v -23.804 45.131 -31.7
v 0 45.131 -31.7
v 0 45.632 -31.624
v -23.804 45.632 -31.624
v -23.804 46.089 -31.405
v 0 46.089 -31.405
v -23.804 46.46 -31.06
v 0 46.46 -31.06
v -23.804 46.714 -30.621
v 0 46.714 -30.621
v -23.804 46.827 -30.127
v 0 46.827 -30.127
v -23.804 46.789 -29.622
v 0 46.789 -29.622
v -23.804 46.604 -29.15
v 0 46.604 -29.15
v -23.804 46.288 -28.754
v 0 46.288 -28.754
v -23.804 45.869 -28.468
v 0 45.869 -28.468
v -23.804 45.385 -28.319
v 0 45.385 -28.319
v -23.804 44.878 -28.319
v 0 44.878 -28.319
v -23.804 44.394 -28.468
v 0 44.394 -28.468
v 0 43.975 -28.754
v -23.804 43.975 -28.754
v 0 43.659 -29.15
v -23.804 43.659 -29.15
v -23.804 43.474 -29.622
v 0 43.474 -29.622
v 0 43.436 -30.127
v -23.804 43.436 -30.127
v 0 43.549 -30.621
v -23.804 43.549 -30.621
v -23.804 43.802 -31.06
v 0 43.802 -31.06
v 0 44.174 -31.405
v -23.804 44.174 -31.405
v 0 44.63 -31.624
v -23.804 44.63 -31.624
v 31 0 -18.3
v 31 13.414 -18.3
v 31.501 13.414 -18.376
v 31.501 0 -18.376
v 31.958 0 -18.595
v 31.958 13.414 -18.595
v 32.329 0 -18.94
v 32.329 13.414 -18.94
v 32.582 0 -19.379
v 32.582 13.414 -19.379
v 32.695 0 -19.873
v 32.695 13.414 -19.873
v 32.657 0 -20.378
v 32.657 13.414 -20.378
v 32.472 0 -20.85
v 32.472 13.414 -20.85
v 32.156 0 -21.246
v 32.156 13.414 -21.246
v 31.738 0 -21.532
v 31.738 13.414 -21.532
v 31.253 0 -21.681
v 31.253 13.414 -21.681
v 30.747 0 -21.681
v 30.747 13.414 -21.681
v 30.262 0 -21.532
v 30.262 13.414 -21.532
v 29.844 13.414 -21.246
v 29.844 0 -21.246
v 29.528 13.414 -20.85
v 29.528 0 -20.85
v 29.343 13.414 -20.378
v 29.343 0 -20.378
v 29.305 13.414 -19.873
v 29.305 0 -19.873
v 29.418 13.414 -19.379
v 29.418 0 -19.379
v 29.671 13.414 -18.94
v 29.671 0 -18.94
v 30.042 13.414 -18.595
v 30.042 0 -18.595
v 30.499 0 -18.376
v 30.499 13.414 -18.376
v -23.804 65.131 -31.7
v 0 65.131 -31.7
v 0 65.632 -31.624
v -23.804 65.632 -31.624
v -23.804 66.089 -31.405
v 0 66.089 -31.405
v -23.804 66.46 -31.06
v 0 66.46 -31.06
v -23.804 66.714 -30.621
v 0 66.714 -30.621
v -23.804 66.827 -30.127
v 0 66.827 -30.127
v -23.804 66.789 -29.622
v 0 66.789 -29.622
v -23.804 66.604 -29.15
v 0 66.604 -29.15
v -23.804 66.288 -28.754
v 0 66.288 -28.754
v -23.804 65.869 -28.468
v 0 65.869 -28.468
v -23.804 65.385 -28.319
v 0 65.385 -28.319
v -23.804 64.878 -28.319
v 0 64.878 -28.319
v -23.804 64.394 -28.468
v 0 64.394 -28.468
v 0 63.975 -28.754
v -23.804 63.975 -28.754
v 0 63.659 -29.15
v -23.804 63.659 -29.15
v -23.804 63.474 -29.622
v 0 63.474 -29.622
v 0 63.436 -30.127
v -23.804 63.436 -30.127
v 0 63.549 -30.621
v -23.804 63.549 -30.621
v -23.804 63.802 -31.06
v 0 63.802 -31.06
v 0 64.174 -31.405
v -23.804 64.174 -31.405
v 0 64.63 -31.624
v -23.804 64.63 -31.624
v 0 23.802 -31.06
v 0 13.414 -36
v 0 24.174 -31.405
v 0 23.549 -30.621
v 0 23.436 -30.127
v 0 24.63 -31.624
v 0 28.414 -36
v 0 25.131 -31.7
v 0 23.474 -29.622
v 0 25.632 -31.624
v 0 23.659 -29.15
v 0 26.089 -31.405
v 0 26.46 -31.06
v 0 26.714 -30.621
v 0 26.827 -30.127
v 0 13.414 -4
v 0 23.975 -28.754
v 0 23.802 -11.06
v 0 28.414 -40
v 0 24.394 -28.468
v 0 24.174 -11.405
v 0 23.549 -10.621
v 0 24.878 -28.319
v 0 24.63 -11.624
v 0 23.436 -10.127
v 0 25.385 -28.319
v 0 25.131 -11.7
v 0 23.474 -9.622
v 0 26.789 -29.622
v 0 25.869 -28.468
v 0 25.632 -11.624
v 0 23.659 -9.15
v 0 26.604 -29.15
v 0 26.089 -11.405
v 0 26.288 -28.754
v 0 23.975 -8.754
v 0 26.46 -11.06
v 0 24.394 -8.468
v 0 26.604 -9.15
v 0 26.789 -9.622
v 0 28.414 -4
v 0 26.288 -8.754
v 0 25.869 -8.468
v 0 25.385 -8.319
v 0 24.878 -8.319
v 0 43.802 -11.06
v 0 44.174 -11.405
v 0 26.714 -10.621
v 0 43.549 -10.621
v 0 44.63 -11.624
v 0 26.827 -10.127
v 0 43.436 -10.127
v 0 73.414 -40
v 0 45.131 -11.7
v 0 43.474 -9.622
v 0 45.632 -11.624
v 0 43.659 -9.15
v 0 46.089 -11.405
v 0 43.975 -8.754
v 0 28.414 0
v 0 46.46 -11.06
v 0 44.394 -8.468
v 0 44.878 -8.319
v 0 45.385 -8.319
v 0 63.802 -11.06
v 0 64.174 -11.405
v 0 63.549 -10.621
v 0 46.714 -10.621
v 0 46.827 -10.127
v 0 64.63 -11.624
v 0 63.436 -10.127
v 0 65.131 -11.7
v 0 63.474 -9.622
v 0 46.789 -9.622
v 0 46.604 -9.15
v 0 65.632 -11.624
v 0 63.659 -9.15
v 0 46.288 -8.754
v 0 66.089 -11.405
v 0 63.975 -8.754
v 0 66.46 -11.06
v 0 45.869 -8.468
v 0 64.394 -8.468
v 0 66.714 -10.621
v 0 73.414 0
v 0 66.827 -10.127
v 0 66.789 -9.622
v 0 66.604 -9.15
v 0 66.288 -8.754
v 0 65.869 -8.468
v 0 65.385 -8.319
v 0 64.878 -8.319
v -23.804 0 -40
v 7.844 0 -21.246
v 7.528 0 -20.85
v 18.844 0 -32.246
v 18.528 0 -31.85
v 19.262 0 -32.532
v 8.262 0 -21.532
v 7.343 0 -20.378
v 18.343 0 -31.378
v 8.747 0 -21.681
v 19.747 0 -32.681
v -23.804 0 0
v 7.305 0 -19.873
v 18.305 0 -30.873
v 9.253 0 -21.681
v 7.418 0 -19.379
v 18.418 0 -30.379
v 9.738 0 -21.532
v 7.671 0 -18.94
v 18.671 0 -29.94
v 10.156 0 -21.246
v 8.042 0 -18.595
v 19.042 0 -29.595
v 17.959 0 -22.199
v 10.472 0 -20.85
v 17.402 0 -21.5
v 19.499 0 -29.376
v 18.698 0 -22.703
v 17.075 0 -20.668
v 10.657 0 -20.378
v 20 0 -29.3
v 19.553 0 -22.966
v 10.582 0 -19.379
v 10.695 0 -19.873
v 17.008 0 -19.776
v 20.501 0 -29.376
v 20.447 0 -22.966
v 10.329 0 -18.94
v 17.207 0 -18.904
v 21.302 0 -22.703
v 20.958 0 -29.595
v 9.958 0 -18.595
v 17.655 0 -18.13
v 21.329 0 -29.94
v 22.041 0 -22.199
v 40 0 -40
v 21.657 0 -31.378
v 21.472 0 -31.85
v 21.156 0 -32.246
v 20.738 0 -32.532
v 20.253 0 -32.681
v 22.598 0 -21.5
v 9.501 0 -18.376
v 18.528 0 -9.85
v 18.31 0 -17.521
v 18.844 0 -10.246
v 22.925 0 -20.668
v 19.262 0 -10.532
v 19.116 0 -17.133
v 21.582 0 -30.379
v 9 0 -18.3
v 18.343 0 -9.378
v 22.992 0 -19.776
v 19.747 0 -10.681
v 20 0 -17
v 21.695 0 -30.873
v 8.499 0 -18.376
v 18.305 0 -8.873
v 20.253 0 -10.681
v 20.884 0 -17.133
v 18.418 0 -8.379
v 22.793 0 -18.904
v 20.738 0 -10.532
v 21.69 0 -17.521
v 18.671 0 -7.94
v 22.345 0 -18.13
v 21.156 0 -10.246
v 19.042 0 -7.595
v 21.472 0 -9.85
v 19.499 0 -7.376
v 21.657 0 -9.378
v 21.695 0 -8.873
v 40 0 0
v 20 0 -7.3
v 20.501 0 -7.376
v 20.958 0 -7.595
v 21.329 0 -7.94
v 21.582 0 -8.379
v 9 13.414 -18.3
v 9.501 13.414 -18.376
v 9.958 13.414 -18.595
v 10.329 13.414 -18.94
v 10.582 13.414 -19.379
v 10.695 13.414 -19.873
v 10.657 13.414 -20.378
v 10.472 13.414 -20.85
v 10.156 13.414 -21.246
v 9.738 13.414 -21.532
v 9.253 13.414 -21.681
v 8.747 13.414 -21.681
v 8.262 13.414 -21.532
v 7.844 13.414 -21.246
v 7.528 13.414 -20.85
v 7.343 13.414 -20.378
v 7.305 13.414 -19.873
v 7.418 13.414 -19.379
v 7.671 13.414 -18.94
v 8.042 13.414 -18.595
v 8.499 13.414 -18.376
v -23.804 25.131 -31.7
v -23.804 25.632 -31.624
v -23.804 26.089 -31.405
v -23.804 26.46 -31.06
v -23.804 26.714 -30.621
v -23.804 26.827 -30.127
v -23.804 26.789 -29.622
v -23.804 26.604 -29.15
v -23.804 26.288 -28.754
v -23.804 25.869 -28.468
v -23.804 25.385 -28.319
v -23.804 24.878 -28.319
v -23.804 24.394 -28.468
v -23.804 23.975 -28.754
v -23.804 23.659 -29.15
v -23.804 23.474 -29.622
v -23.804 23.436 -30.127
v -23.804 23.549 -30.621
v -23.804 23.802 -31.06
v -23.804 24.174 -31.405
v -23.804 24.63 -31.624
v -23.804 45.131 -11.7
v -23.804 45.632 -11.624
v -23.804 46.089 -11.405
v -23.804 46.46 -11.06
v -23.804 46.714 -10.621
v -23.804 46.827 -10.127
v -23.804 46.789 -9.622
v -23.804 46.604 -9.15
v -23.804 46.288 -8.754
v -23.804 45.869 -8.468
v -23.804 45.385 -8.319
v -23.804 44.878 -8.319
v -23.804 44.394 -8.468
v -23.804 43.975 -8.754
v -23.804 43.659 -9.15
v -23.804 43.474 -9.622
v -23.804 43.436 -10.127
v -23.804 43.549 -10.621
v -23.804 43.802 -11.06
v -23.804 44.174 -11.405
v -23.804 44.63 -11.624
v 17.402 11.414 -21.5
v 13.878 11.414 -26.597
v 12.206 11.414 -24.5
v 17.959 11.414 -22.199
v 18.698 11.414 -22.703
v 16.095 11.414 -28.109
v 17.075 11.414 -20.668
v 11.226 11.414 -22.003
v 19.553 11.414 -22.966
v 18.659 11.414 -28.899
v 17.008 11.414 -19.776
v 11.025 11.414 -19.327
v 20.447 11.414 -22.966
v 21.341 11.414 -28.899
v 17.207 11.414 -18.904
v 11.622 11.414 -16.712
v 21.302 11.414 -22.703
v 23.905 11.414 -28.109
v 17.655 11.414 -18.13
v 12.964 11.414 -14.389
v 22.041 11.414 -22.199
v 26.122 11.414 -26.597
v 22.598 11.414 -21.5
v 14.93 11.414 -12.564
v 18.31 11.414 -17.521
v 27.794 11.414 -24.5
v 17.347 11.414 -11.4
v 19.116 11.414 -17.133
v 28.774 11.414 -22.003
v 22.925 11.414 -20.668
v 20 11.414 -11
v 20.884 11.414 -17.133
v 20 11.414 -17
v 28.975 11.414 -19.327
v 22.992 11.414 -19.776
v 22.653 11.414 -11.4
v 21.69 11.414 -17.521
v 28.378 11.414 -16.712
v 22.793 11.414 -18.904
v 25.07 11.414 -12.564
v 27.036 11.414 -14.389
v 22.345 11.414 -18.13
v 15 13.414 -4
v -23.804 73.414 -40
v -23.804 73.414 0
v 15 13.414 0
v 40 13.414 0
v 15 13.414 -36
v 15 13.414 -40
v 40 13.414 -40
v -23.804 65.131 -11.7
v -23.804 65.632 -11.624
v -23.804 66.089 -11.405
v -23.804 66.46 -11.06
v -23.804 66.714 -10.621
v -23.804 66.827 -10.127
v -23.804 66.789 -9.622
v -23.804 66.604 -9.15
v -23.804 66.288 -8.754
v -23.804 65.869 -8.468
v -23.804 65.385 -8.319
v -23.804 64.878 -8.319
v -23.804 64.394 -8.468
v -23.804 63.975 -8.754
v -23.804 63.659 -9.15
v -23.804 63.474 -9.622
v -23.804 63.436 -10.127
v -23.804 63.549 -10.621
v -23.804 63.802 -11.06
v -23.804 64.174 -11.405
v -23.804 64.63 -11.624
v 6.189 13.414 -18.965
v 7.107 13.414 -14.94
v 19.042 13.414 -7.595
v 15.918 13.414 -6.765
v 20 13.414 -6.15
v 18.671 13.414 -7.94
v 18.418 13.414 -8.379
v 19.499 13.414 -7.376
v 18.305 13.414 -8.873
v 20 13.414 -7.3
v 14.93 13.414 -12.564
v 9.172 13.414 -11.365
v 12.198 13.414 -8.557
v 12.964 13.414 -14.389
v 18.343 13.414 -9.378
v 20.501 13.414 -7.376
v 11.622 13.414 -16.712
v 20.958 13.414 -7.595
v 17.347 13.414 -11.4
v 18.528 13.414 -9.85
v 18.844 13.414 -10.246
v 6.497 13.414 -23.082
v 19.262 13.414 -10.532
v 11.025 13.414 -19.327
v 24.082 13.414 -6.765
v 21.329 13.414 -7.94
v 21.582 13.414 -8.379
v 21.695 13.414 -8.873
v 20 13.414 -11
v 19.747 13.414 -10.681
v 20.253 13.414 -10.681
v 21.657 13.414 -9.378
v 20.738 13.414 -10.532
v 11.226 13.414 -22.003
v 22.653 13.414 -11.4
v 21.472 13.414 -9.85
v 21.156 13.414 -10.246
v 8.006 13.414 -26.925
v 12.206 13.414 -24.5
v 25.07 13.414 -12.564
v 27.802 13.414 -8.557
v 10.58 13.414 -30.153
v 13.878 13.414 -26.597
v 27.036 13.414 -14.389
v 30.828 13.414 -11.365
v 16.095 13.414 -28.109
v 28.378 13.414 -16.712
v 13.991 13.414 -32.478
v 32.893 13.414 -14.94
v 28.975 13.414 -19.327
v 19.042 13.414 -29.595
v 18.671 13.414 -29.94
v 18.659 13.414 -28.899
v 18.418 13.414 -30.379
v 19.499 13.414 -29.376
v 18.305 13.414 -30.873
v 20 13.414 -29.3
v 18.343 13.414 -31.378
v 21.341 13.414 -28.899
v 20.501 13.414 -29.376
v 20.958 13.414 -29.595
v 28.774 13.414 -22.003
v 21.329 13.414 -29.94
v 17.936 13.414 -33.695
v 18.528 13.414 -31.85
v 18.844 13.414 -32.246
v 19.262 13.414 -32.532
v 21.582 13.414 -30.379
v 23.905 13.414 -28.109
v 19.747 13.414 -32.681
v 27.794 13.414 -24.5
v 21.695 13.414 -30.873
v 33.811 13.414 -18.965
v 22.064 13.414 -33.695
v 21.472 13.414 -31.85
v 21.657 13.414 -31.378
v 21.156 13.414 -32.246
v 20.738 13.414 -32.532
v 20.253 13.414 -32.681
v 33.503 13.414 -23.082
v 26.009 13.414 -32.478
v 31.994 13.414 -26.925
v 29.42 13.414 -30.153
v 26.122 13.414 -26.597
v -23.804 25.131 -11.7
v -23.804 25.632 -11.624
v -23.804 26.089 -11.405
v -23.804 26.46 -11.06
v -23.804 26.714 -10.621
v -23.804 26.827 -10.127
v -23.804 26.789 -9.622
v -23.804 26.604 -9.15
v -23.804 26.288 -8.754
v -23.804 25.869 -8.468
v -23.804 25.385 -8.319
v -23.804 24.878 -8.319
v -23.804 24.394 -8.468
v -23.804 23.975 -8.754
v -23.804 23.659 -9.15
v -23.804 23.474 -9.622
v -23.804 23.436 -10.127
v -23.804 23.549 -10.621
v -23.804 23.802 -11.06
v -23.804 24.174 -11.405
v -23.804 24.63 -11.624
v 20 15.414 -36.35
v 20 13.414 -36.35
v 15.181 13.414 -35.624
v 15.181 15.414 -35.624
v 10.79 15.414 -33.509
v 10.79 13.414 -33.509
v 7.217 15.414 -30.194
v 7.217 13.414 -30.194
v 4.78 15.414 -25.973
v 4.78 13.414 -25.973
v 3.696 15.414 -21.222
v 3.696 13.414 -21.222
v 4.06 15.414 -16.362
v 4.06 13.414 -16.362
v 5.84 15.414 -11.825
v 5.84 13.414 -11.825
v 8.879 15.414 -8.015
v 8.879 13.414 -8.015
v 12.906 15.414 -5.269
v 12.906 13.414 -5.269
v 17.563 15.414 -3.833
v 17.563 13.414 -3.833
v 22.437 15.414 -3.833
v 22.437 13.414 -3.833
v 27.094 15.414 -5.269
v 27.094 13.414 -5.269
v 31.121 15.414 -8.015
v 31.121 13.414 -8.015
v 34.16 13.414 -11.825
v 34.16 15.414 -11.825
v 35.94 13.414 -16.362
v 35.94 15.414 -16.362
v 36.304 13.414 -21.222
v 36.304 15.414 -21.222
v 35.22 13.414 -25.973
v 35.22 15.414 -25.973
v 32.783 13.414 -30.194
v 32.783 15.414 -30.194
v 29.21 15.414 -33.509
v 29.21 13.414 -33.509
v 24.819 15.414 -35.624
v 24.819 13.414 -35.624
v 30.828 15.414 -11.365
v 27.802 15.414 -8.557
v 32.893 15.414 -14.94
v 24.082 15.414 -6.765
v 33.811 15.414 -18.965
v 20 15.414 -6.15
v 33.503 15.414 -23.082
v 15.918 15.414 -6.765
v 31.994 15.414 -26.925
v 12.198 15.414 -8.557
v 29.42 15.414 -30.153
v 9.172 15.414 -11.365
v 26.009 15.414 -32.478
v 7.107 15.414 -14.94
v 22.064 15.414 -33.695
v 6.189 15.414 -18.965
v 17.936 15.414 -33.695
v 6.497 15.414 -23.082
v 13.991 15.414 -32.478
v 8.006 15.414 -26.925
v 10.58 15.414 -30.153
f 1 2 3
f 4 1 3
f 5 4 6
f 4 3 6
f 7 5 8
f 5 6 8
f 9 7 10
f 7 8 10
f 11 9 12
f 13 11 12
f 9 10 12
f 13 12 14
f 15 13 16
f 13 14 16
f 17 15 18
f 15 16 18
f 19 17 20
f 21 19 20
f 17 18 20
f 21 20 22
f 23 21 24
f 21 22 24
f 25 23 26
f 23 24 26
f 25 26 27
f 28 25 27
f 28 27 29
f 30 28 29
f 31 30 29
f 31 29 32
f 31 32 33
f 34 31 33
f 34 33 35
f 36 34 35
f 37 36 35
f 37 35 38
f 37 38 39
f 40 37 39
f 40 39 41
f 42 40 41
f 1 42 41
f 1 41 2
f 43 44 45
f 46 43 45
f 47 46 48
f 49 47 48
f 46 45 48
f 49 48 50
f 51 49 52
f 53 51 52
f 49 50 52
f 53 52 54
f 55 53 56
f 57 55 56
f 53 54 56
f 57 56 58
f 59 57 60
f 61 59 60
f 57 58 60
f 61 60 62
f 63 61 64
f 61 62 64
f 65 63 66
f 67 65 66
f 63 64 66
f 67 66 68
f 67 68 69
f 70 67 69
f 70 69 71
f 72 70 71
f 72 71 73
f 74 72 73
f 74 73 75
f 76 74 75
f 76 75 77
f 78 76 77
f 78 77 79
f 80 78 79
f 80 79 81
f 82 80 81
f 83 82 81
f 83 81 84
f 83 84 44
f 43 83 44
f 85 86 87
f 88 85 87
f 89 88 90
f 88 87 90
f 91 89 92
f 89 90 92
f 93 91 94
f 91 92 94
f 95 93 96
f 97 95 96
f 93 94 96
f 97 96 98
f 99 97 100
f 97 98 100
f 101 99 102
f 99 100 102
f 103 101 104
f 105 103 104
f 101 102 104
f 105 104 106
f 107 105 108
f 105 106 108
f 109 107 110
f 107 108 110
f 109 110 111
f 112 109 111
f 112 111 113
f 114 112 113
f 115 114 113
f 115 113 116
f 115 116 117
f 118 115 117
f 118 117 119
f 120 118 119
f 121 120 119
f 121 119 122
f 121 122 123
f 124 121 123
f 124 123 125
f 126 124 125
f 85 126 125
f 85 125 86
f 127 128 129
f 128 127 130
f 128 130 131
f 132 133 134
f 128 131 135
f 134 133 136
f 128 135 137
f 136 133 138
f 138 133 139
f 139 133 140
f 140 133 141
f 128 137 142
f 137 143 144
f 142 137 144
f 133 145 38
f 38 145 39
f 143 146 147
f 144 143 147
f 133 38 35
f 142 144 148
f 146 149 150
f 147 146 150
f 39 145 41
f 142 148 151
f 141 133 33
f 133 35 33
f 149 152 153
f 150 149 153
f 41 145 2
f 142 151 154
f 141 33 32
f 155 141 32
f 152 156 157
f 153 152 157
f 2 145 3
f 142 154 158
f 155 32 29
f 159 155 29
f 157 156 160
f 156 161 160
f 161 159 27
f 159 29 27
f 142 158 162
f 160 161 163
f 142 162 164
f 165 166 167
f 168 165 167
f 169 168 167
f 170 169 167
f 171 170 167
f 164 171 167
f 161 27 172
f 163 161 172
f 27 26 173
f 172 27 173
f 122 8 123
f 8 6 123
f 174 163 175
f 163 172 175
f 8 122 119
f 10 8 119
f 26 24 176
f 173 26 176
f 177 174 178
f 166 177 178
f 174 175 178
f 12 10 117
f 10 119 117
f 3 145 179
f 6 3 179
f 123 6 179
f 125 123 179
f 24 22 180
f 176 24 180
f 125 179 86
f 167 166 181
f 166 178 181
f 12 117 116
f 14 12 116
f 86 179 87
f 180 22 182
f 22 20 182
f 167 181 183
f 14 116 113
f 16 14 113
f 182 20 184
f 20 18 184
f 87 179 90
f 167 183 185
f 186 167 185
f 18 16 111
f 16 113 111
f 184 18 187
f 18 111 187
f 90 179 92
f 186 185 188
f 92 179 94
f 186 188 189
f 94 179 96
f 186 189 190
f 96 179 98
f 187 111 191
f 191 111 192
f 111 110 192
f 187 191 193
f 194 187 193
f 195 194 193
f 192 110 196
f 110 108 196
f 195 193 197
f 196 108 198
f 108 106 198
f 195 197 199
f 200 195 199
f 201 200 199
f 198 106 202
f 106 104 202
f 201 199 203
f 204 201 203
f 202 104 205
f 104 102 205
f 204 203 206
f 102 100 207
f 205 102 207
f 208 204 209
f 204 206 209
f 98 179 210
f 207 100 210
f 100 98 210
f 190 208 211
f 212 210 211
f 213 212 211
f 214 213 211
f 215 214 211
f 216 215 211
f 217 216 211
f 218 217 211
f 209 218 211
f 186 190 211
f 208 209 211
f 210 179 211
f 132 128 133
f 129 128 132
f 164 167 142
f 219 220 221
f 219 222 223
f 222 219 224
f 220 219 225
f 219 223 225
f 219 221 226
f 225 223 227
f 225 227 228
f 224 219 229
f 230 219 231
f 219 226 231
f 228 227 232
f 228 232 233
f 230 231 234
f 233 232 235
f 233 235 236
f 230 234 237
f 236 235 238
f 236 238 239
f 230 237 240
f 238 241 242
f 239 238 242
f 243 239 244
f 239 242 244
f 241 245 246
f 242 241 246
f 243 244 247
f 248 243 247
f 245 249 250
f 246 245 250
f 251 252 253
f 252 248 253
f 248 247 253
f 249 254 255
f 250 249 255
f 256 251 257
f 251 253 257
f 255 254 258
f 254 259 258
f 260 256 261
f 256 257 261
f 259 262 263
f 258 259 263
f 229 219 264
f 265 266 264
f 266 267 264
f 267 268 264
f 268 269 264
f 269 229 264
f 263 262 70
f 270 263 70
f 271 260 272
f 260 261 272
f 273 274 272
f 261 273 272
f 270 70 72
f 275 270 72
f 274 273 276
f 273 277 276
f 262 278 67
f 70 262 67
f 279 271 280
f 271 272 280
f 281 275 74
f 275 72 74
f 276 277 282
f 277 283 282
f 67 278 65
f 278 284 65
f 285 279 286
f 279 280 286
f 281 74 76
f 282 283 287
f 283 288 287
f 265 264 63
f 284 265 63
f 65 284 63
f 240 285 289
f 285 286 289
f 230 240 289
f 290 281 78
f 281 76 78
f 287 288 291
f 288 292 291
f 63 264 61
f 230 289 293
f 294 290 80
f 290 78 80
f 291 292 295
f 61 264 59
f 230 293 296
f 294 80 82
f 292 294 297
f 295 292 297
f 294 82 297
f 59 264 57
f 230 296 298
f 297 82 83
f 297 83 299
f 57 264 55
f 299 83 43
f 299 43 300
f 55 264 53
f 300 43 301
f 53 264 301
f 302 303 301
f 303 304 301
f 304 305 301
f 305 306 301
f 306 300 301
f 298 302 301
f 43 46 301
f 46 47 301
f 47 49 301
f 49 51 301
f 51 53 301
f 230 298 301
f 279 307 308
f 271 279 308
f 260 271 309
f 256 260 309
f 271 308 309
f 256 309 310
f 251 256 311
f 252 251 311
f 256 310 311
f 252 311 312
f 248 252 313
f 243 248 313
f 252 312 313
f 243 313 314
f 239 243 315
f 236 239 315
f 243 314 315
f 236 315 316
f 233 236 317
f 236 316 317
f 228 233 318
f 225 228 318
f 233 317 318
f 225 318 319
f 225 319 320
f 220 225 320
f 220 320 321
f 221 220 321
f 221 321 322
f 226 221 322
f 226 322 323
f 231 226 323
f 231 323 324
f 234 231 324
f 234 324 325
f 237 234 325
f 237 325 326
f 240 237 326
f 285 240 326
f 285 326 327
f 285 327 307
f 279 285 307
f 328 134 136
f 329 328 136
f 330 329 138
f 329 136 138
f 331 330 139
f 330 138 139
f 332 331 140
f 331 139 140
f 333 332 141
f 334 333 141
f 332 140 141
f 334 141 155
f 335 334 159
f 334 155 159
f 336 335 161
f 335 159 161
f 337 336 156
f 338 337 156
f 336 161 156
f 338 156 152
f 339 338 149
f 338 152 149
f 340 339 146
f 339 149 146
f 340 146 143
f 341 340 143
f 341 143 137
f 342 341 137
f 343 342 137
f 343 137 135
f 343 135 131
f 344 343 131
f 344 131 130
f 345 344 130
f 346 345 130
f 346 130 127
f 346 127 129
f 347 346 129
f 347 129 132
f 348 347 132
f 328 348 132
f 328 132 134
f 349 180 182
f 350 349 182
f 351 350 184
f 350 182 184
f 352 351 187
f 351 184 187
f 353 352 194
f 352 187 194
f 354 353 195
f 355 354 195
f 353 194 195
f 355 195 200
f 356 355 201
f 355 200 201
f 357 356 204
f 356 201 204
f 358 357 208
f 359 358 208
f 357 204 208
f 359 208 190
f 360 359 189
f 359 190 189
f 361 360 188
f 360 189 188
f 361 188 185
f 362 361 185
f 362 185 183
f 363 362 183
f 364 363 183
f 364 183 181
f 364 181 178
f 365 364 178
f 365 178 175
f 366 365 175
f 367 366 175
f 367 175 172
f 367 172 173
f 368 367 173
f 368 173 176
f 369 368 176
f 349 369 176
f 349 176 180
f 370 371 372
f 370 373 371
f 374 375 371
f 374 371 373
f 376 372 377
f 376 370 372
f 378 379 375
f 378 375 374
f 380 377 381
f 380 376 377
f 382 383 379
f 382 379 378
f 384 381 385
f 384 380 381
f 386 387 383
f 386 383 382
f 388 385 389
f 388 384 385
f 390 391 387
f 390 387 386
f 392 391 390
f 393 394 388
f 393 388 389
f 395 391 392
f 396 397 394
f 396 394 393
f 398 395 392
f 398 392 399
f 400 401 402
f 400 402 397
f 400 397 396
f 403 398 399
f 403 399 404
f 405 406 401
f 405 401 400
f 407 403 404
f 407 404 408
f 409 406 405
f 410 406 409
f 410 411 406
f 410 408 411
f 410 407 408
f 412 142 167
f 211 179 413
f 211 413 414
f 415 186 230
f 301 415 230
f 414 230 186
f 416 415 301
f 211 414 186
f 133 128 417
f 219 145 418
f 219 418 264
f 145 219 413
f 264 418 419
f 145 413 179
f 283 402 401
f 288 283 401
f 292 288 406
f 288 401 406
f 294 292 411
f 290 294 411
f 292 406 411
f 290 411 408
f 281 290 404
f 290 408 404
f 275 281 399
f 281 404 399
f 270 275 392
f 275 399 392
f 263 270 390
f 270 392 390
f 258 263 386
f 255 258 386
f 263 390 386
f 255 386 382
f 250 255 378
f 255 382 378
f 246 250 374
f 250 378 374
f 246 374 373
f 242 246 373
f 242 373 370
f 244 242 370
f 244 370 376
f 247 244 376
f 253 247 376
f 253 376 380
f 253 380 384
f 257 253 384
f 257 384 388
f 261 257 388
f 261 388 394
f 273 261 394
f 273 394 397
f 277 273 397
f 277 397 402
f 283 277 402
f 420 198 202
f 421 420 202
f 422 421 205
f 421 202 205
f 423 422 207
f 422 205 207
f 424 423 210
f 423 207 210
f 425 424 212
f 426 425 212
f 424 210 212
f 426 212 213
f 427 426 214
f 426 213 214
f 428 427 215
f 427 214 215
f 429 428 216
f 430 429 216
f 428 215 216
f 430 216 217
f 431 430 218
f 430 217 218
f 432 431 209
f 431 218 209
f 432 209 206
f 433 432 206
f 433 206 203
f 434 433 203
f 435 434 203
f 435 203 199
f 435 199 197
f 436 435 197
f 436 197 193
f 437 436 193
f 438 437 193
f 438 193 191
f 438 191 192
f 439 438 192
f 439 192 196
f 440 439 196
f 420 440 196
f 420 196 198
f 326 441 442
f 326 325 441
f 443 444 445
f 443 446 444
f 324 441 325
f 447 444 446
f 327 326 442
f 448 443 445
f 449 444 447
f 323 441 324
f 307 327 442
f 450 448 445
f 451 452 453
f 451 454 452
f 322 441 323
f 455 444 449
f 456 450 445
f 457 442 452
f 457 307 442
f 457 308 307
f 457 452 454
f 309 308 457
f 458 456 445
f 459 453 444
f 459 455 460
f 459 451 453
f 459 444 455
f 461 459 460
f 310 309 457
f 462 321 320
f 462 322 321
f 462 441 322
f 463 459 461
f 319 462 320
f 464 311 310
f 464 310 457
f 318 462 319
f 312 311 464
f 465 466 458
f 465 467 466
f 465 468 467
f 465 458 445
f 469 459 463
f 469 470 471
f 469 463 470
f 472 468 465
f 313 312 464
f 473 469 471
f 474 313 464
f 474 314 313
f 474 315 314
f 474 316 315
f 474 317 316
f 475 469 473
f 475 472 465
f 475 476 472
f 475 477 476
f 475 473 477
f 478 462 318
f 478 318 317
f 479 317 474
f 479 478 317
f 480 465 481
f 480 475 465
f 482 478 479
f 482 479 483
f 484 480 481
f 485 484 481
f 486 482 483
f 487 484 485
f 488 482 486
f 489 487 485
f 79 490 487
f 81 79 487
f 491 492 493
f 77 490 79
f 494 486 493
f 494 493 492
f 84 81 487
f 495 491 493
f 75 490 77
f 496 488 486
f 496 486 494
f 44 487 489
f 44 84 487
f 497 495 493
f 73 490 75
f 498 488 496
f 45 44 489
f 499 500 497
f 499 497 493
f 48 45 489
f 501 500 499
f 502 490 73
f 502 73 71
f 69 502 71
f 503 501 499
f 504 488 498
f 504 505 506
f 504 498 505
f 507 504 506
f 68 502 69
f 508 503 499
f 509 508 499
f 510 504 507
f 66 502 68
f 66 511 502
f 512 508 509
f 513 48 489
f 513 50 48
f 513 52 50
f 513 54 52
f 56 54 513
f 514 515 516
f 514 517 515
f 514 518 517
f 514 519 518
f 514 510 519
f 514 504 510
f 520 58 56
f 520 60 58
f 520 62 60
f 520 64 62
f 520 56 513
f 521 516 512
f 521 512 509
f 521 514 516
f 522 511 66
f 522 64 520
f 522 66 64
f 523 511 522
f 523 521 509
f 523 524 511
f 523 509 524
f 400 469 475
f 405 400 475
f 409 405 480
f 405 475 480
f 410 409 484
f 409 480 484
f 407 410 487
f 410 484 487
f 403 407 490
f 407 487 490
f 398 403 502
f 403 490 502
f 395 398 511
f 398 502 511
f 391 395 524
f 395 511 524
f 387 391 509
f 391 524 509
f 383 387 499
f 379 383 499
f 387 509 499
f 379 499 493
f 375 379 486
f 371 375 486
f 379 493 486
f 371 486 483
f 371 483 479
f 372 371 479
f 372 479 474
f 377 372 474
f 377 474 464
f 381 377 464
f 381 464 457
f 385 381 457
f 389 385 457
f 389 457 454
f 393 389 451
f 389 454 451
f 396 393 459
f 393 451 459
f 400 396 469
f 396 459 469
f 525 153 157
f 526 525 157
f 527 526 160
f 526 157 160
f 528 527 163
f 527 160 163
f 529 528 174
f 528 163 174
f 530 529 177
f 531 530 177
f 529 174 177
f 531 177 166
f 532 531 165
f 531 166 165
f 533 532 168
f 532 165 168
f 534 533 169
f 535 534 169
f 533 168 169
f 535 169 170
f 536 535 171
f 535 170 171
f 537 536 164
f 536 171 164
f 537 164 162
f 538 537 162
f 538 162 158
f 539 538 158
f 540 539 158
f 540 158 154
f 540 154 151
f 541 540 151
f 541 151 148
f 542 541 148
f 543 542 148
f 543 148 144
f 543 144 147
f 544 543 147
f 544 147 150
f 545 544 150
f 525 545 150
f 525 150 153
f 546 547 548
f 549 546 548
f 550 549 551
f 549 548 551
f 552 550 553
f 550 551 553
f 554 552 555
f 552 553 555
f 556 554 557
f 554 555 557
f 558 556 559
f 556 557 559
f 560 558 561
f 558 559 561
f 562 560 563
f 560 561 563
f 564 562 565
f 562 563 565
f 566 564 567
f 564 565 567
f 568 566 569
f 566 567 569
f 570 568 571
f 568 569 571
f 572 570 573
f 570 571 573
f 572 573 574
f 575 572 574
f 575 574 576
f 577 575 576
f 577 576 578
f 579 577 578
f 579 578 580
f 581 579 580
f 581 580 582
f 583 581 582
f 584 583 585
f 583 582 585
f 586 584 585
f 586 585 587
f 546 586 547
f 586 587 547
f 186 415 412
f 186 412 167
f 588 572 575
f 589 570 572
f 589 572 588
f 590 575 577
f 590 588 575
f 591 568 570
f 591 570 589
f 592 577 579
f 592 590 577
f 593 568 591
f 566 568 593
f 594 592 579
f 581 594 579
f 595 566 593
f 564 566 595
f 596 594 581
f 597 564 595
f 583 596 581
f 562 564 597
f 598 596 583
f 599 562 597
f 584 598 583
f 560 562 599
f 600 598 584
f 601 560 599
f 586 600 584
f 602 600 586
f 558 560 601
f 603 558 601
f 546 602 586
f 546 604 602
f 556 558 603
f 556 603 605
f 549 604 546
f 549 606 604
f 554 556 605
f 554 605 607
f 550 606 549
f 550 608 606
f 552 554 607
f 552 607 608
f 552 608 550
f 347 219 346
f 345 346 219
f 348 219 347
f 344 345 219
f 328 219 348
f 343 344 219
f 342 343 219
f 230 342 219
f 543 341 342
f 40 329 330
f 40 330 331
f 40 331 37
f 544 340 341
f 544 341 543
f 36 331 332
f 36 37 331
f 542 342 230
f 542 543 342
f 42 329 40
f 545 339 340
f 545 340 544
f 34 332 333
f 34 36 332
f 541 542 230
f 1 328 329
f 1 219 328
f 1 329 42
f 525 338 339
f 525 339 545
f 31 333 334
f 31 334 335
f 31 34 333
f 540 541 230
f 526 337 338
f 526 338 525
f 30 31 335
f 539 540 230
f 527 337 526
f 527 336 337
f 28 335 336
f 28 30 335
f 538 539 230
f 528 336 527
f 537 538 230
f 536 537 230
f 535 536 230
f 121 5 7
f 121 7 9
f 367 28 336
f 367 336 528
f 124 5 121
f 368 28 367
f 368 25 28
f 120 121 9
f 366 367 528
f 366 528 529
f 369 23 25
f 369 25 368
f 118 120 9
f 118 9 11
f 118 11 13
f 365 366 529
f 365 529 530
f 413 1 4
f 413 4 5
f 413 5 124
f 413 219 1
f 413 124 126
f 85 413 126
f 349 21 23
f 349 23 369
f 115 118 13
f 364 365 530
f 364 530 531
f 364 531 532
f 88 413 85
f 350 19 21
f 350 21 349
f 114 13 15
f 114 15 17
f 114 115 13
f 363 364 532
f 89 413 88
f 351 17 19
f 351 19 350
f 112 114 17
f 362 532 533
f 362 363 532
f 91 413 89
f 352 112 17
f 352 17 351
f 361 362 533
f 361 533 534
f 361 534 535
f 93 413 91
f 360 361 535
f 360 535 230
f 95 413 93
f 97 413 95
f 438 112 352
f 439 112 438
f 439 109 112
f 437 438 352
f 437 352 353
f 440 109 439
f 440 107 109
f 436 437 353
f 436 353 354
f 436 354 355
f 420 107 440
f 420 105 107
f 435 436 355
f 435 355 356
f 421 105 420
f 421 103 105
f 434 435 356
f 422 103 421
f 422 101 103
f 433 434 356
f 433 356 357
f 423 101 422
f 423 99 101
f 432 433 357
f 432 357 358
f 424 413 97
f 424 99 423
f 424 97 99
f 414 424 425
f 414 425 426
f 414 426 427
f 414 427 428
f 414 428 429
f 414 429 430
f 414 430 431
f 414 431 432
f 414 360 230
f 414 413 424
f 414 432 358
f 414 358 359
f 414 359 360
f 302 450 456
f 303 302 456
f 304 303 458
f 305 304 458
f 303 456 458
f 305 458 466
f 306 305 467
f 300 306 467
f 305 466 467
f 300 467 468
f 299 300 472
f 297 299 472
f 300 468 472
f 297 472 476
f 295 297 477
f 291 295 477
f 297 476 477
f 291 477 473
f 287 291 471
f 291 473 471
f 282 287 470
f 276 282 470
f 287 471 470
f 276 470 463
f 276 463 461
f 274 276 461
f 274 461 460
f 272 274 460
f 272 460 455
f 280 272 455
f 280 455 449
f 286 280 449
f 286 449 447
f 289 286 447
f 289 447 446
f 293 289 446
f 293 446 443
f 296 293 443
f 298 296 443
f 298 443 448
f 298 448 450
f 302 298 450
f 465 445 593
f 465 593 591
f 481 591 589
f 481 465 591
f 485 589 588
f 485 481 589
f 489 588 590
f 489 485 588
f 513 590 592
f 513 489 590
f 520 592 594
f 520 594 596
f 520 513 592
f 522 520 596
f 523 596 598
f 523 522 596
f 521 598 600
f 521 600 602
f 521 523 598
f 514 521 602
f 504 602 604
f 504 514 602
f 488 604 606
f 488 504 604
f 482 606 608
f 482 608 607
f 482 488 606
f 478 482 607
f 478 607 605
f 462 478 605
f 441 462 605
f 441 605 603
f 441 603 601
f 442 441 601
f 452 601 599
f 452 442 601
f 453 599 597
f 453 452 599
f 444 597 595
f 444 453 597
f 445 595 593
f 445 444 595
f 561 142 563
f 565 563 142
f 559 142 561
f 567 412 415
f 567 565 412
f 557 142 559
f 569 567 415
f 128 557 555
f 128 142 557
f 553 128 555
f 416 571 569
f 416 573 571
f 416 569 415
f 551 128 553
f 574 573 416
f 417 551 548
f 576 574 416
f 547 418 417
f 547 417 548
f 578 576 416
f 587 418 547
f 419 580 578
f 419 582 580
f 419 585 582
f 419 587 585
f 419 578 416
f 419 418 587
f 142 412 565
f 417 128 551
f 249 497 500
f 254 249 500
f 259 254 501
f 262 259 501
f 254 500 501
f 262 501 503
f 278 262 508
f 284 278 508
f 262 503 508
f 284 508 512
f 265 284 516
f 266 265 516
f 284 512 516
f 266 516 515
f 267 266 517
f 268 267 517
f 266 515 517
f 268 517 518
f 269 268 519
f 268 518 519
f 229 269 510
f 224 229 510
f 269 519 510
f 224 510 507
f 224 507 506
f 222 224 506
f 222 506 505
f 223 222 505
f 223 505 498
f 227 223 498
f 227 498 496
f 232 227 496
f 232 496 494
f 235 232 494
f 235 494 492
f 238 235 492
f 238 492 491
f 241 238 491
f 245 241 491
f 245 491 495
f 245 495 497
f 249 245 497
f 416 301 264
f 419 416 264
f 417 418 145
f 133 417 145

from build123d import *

# Parameters (mm, degrees)
SKETCH1_W           = 40
SKETCH1_H           = 40
BOSS_EXTRUDE1_DEPTH = 13.413545042
SKETCH2_R           = 3
CUT_EXTRUDE1_DEPTH  = 59.13710683
SKETCH3_W           = 40
SKETCH3_H           = 73.413545042
BOSS_EXTRUDE2_DEPTH = 23.804241557
SKETCH4_R           = 1.7
CUT_EXTRUDE2_DEPTH  = 93.679817629
SKETCH5_R           = 1.7
CUT_EXTRUDE3_DEPTH  = 83.462112512
SKETCH6_R           = 16.35
SKETCH6_R_2         = 13.85
BOSS_EXTRUDE3_DEPTH = 2
BOSS_EXTRUDE4_DEPTH = 4
BOSS_EXTRUDE5_DEPTH = 4
SKETCH9_R           = 9
CUT_EXTRUDE4_DEPTH  = 2


with BuildPart() as part:
    # Sketch1 → Boss-Extrude1 (new body)
    with BuildSketch(Plane(origin=(0, 0, 0), x_dir=(1, 0, 0), z_dir=(0, 1, 0))):
        with Locations((20, 20)):
            Rectangle(SKETCH1_W, SKETCH1_H)
    extrude(amount=BOSS_EXTRUDE1_DEPTH)

    # Sketch2 → Cut-Extrude1 (cut, through all)
    with BuildSketch(Plane(origin=(0, 13.413545042, 0), x_dir=(1, 0, 0), z_dir=(0, 1, 0))):
        with Locations(Location((20, 20, 0), (0, 0, 270))):
            Circle(SKETCH2_R)
    extrude(amount=-CUT_EXTRUDE1_DEPTH, mode=Mode.SUBTRACT)

    # Sketch3 → Boss-Extrude2 (add)
    with BuildSketch(Plane.ZY):
        with Locations((-20, 36.706772521)):
            Rectangle(SKETCH3_W, SKETCH3_H)
    extrude(amount=BOSS_EXTRUDE2_DEPTH)

    # Sketch4 → Cut-Extrude2 (cut, through all)
    with BuildSketch(Plane(origin=(0, 0, 0), x_dir=(0, 0, -1), z_dir=(1, 0, 0))):
        with Locations((10, 65.131260141)):
            Circle(SKETCH4_R)
        with Locations((30, 65.131260141)):
            Circle(SKETCH4_R)
        with Locations((10, 45.131260141)):
            Circle(SKETCH4_R)
        with Locations((30, 45.131260141)):
            Circle(SKETCH4_R)
        with Locations((10, 25.131260141)):
            Circle(SKETCH4_R)
        with Locations((30, 25.131260141)):
            Circle(SKETCH4_R)
    extrude(amount=-CUT_EXTRUDE2_DEPTH, mode=Mode.SUBTRACT)

    # Sketch5 → Cut-Extrude3 (cut, through all)
    with BuildSketch(Plane(origin=(0, 13.413545042, 0), x_dir=(1, 0, 0), z_dir=(0, 1, 0))):
        with Locations(Location((20, 31, 0), (0, 0, 270))):
            Circle(SKETCH5_R)
        with Locations(Location((31, 20, 0), (0, 0, 270))):
            Circle(SKETCH5_R)
        with Locations(Location((20, 9, 0), (0, 0, 270))):
            Circle(SKETCH5_R)
        with Locations(Location((9, 20, 0), (0, 0, 270))):
            Circle(SKETCH5_R)
    extrude(amount=-CUT_EXTRUDE3_DEPTH, mode=Mode.SUBTRACT)

    # Sketch6 → Boss-Extrude3 (add)
    with BuildSketch(Plane(origin=(0, 13.413545042, 0), x_dir=(1, 0, 0), z_dir=(0, 1, 0))):
        with Locations(Location((20, 20, 0), (0, 0, 90))):
            Circle(SKETCH6_R)
        with Locations(Location((20, 20, 0), (0, 0, 270))):
            Circle(SKETCH6_R_2, mode=Mode.SUBTRACT)
    extrude(amount=BOSS_EXTRUDE3_DEPTH)

    # Sketch7 → Boss-Extrude4 (add)
    with BuildSketch(Plane(origin=(0, 0, -40), x_dir=(-1, 0, 0), z_dir=(0, 0, -1))):
        Polygon((-15, 13.413545042), (0, 28.413545042), (0, 13.413545042), align=None)
    extrude(amount=-BOSS_EXTRUDE4_DEPTH)

    # Sketch8 → Boss-Extrude5 (add)
    with BuildSketch(Plane.XY):
        Polygon((0, 28.413545042), (0, 13.413545042), (15, 13.413545042), align=None)
    extrude(amount=-BOSS_EXTRUDE5_DEPTH)

    # Sketch9 → Cut-Extrude4 (cut)
    with BuildSketch(Plane(origin=(0, 13.413545042, 0), x_dir=(1, 0, 0), z_dir=(0, 1, 0))):
        with Locations(Location((20, 20, 0), (0, 0, 270))):
            Circle(SKETCH9_R)
    extrude(amount=-CUT_EXTRUDE4_DEPTH, mode=Mode.SUBTRACT)


solid = part.part
